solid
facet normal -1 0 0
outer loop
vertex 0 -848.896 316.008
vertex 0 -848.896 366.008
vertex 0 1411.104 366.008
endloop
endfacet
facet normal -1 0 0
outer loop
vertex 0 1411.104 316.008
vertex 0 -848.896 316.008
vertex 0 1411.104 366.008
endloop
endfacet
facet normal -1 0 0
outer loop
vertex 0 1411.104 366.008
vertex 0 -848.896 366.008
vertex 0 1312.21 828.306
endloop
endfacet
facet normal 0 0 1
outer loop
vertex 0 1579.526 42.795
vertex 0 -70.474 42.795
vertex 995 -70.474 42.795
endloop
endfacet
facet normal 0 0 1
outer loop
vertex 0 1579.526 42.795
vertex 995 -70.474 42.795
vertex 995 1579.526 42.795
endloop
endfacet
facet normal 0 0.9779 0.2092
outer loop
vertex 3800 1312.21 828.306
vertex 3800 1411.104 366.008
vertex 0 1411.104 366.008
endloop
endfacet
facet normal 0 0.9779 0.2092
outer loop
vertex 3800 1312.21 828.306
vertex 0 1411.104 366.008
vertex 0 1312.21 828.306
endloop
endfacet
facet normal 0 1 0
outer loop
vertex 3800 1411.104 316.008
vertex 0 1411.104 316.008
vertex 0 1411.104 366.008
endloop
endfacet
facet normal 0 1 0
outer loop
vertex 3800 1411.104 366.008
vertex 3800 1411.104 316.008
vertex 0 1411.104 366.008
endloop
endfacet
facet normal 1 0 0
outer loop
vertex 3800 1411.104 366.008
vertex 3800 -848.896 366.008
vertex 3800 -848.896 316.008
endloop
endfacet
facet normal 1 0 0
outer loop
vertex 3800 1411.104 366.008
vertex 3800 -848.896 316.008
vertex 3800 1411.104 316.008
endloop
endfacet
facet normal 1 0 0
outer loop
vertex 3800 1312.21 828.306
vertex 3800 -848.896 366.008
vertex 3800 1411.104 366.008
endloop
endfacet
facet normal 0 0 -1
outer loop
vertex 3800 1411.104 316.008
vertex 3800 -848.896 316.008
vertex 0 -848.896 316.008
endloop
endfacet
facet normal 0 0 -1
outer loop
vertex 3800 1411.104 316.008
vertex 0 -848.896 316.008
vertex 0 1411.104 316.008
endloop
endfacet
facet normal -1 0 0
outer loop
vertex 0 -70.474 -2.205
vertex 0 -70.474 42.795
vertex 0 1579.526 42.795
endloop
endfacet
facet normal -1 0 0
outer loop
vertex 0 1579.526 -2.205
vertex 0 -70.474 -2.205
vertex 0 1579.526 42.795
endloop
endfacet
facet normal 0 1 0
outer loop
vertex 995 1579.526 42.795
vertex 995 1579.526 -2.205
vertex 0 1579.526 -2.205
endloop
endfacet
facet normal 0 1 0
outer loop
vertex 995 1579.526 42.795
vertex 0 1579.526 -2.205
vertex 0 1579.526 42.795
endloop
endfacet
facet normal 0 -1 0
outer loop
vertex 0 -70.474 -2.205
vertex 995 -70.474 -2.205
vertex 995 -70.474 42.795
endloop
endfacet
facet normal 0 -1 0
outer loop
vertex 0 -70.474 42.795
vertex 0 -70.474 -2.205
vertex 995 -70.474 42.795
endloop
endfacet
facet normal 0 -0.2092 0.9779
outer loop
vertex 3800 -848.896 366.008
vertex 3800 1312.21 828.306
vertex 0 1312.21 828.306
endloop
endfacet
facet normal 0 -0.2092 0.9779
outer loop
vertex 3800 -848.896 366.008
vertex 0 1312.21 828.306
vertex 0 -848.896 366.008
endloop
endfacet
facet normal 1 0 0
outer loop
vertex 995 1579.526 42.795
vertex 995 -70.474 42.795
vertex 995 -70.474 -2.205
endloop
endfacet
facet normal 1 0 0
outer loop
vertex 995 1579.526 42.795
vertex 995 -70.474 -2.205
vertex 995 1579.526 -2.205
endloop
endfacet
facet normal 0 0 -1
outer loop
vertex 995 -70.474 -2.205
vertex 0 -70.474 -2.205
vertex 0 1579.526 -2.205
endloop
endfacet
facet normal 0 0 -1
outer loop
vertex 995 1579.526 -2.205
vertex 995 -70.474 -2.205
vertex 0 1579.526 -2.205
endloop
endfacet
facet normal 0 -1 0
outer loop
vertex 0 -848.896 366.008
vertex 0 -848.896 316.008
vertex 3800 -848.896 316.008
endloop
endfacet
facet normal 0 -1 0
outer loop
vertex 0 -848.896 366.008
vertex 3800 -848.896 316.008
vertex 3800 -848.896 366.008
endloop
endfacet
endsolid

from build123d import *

# Parameters (mm, degrees)
F0_W     = 1650
F0_H     = 45
F1_DEPTH = 995
F2_W     = 2260
F2_H     = 50
F3_DEPTH = 3800
F5_DEPTH = 3800


with BuildPart() as f1:
    # F0 (on Right) → F1 (new body)
    with BuildSketch(Plane.YZ):
        with Locations((754.526432, 20.294605)):
            Rectangle(F0_W, F0_H)
    extrude(amount=F1_DEPTH)


with BuildPart() as f3:
    # F2 (on Right) → F3 (new body)
    with BuildSketch(Plane.YZ):
        with Locations((281.103551, 341.007764)):
            Rectangle(F2_W, F2_H)
    extrude(amount=F3_DEPTH)

    # F4 (on face) → F5 (join)
    with BuildSketch(Plane.YZ.offset(3800)):
        Polygon((1312.209746, 828.306386), (-848.896449, 366.007764), (1411.103551, 366.007764), align=None)
    extrude(amount=-F5_DEPTH)


solid = Compound([f1.part, f3.part])
